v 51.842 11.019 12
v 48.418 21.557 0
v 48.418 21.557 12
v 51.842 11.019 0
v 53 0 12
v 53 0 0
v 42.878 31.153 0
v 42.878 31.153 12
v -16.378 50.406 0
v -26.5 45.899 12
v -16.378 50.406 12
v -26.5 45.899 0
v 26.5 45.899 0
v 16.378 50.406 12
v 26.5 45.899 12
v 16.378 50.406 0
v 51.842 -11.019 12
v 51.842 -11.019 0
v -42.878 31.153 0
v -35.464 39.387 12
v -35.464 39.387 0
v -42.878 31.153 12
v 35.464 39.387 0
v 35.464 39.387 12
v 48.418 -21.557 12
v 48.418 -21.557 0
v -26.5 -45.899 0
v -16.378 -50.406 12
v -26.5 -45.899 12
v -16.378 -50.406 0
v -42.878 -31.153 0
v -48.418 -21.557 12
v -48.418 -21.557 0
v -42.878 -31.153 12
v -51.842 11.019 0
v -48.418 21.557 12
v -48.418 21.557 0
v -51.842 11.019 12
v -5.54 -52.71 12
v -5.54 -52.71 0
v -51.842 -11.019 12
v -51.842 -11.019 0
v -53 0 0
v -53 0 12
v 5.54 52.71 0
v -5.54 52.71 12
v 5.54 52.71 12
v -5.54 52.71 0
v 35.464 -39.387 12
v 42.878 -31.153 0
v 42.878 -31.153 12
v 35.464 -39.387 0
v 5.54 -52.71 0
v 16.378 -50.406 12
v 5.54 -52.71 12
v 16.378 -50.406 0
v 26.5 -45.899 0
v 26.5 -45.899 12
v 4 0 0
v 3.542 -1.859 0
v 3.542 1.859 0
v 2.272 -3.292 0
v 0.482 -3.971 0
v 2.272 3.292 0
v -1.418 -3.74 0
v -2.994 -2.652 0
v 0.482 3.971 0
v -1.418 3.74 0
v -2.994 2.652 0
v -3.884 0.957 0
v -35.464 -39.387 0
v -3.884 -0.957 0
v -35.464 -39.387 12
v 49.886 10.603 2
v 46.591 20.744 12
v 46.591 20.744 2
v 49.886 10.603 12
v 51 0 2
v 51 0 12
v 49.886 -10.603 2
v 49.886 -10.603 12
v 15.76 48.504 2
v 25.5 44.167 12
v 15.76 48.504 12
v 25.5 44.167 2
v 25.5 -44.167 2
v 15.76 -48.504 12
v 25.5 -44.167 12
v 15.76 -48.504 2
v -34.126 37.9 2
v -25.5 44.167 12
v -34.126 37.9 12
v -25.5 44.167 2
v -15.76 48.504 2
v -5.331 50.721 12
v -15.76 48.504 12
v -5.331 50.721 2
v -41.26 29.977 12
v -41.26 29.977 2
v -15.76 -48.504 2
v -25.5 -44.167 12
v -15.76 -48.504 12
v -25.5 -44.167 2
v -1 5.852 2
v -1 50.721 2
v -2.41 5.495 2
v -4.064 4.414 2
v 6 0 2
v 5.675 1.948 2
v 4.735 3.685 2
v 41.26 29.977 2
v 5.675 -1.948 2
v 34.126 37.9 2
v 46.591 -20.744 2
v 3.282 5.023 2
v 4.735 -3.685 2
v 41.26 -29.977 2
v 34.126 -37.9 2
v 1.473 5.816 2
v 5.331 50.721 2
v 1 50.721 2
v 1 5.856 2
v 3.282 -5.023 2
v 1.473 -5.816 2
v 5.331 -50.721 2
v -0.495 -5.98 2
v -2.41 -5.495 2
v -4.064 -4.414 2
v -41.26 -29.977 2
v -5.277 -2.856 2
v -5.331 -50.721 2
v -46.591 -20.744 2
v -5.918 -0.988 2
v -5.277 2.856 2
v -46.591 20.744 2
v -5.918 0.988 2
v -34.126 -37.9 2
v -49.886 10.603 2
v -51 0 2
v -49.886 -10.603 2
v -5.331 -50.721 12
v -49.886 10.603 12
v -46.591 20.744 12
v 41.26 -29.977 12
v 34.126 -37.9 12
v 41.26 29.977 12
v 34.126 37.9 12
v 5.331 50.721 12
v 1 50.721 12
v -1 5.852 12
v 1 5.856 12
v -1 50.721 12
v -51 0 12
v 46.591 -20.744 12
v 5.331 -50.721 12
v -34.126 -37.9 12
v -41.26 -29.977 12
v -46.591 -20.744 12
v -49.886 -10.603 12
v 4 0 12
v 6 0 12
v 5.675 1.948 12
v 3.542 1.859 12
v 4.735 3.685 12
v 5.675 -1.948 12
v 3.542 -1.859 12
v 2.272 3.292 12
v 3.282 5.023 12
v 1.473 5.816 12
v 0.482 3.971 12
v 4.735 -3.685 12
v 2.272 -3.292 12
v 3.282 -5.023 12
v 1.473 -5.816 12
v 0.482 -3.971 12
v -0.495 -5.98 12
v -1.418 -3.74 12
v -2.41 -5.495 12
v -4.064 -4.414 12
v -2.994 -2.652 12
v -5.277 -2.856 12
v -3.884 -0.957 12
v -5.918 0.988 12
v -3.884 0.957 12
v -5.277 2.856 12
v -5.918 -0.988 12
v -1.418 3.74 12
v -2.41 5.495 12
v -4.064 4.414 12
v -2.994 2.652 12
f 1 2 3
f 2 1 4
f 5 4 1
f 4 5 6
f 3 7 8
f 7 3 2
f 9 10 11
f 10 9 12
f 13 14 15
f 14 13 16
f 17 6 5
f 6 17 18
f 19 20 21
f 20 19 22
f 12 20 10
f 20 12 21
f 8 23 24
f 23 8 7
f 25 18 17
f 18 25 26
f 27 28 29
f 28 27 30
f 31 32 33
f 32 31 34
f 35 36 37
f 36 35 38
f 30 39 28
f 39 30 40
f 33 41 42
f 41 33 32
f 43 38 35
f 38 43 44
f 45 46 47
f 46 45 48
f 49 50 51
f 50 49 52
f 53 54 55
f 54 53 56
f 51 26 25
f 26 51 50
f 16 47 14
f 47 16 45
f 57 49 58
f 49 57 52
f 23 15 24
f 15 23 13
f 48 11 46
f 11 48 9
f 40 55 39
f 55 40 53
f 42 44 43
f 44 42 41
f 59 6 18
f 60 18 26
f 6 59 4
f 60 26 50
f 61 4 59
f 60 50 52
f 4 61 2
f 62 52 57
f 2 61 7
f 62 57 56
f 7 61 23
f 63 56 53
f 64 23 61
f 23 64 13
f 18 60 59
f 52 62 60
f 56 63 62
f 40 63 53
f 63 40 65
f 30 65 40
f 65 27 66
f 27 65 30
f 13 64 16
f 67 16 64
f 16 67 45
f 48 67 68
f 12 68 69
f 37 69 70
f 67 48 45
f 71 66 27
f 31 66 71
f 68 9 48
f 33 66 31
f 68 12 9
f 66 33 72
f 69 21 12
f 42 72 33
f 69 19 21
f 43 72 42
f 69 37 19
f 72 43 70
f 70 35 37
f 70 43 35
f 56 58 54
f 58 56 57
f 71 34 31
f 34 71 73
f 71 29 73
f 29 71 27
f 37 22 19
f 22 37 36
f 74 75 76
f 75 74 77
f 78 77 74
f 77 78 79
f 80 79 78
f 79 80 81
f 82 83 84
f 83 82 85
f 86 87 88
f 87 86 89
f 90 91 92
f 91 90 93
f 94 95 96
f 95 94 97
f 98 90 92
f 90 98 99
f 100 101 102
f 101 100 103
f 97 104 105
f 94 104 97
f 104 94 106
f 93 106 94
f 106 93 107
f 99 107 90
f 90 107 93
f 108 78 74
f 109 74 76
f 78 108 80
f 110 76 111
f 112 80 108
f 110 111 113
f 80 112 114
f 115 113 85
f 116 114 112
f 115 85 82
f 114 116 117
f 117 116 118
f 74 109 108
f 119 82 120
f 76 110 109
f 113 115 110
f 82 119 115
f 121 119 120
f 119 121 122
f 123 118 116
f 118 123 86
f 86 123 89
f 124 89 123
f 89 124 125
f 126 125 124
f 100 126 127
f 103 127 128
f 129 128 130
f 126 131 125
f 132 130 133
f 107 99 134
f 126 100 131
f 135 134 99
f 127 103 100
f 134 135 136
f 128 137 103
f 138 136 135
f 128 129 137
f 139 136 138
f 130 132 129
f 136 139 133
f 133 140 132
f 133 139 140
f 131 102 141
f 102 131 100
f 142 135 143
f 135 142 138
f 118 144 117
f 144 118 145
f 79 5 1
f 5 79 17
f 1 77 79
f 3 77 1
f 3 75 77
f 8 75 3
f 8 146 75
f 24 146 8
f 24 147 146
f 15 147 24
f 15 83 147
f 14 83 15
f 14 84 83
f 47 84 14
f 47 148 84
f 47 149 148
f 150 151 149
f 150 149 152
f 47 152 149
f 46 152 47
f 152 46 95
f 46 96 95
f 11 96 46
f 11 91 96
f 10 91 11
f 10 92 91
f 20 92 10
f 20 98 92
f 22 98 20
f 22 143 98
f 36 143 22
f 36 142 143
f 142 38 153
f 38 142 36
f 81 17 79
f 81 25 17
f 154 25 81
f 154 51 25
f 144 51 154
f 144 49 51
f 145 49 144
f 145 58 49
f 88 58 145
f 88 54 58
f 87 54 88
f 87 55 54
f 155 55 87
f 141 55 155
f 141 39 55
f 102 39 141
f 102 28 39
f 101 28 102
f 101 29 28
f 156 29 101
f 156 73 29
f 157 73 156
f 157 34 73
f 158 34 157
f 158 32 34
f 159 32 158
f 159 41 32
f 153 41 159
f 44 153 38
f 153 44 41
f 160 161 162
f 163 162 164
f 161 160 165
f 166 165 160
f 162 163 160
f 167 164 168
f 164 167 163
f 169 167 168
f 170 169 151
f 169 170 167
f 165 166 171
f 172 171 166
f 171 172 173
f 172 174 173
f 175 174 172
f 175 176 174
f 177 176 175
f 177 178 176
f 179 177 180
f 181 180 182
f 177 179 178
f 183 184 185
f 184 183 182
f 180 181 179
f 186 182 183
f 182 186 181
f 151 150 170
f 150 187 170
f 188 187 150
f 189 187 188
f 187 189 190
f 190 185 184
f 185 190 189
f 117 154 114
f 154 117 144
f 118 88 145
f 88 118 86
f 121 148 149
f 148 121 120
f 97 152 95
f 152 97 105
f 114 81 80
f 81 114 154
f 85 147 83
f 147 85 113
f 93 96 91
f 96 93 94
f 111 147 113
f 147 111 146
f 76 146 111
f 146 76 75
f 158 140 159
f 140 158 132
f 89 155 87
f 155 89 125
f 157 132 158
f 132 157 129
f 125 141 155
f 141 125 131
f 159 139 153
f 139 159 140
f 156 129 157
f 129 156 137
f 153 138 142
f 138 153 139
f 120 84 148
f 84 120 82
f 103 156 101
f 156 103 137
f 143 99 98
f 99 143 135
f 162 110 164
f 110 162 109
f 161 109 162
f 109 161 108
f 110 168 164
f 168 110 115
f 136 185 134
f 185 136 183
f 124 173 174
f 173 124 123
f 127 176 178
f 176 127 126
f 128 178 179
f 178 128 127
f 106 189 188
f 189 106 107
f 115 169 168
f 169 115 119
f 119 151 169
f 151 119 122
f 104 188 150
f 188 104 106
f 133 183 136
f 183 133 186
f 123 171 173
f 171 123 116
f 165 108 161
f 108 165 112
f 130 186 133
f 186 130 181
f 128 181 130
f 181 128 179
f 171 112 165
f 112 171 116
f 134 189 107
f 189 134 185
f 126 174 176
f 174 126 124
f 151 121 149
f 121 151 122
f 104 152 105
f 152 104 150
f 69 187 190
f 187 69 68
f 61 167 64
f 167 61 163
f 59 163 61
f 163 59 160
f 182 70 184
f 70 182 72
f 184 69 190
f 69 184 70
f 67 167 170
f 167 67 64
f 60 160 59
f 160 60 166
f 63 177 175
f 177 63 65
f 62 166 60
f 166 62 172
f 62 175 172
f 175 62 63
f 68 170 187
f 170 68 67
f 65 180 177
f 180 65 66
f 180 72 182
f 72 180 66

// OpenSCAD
tank_inner_radius = 51;
tank_wall_thickness = 2;
tank_outer_radius = tank_wall_thickness + tank_inner_radius;

tank_inner_height = 10;
tank_outer_height = tank_inner_height + 2 * tank_wall_thickness;

axle_radius = 4;
axle_hole_inner_radius = 4;
axle_hole_outer_radius = axle_hole_inner_radius + tank_wall_thickness;

water_hole_radius = 2;
water_hole_offset_radius = (tank_inner_radius + axle_hole_outer_radius) / 2;

module cylinder_shell(inner_radius=1, outer_radius=false, thickness=false, height=1) {
	if (outer_radius == false && thickness == false) {
		echo("Must supply one of outer_radius or thickness");
	}
	
	outer_radius = outer_radius != false ? outer_radius : inner_radius + thickness;
	
	difference() {
		cylinder(r=outer_radius, h=height);
		cylinder(r=inner_radius, h=height);
	}
}


module tank() {
	difference() {
		union() {
			difference() {
				cylinder(r=tank_outer_radius, h=tank_outer_height);
				translate([0, 0, tank_wall_thickness])
					cylinder(r=tank_inner_radius, h=tank_inner_height);
			}
			cylinder(r=axle_hole_outer_radius, h=tank_outer_height);
			translate([0, tank_inner_radius / 2, tank_outer_height / 2])
				cube([tank_wall_thickness, tank_inner_radius, tank_outer_height], center=true);
		}
		cylinder(r=axle_hole_inner_radius, h=tank_outer_height);
		color("blue")
		translate([water_hole_offset_radius, 0, tank_outer_height - tank_wall_thickness])
			cylinder(r=water_hole_radius, h=tank_wall_thickness);
	}		
}

difference() {
	tank();
	translate([0, 0, tank_outer_height - tank_wall_thickness])
		cylinder(r=tank_outer_radius, h=tank_wall_thickness);
	*cube([tank_outer_radius, tank_outer_radius, tank_outer_height]);
}
